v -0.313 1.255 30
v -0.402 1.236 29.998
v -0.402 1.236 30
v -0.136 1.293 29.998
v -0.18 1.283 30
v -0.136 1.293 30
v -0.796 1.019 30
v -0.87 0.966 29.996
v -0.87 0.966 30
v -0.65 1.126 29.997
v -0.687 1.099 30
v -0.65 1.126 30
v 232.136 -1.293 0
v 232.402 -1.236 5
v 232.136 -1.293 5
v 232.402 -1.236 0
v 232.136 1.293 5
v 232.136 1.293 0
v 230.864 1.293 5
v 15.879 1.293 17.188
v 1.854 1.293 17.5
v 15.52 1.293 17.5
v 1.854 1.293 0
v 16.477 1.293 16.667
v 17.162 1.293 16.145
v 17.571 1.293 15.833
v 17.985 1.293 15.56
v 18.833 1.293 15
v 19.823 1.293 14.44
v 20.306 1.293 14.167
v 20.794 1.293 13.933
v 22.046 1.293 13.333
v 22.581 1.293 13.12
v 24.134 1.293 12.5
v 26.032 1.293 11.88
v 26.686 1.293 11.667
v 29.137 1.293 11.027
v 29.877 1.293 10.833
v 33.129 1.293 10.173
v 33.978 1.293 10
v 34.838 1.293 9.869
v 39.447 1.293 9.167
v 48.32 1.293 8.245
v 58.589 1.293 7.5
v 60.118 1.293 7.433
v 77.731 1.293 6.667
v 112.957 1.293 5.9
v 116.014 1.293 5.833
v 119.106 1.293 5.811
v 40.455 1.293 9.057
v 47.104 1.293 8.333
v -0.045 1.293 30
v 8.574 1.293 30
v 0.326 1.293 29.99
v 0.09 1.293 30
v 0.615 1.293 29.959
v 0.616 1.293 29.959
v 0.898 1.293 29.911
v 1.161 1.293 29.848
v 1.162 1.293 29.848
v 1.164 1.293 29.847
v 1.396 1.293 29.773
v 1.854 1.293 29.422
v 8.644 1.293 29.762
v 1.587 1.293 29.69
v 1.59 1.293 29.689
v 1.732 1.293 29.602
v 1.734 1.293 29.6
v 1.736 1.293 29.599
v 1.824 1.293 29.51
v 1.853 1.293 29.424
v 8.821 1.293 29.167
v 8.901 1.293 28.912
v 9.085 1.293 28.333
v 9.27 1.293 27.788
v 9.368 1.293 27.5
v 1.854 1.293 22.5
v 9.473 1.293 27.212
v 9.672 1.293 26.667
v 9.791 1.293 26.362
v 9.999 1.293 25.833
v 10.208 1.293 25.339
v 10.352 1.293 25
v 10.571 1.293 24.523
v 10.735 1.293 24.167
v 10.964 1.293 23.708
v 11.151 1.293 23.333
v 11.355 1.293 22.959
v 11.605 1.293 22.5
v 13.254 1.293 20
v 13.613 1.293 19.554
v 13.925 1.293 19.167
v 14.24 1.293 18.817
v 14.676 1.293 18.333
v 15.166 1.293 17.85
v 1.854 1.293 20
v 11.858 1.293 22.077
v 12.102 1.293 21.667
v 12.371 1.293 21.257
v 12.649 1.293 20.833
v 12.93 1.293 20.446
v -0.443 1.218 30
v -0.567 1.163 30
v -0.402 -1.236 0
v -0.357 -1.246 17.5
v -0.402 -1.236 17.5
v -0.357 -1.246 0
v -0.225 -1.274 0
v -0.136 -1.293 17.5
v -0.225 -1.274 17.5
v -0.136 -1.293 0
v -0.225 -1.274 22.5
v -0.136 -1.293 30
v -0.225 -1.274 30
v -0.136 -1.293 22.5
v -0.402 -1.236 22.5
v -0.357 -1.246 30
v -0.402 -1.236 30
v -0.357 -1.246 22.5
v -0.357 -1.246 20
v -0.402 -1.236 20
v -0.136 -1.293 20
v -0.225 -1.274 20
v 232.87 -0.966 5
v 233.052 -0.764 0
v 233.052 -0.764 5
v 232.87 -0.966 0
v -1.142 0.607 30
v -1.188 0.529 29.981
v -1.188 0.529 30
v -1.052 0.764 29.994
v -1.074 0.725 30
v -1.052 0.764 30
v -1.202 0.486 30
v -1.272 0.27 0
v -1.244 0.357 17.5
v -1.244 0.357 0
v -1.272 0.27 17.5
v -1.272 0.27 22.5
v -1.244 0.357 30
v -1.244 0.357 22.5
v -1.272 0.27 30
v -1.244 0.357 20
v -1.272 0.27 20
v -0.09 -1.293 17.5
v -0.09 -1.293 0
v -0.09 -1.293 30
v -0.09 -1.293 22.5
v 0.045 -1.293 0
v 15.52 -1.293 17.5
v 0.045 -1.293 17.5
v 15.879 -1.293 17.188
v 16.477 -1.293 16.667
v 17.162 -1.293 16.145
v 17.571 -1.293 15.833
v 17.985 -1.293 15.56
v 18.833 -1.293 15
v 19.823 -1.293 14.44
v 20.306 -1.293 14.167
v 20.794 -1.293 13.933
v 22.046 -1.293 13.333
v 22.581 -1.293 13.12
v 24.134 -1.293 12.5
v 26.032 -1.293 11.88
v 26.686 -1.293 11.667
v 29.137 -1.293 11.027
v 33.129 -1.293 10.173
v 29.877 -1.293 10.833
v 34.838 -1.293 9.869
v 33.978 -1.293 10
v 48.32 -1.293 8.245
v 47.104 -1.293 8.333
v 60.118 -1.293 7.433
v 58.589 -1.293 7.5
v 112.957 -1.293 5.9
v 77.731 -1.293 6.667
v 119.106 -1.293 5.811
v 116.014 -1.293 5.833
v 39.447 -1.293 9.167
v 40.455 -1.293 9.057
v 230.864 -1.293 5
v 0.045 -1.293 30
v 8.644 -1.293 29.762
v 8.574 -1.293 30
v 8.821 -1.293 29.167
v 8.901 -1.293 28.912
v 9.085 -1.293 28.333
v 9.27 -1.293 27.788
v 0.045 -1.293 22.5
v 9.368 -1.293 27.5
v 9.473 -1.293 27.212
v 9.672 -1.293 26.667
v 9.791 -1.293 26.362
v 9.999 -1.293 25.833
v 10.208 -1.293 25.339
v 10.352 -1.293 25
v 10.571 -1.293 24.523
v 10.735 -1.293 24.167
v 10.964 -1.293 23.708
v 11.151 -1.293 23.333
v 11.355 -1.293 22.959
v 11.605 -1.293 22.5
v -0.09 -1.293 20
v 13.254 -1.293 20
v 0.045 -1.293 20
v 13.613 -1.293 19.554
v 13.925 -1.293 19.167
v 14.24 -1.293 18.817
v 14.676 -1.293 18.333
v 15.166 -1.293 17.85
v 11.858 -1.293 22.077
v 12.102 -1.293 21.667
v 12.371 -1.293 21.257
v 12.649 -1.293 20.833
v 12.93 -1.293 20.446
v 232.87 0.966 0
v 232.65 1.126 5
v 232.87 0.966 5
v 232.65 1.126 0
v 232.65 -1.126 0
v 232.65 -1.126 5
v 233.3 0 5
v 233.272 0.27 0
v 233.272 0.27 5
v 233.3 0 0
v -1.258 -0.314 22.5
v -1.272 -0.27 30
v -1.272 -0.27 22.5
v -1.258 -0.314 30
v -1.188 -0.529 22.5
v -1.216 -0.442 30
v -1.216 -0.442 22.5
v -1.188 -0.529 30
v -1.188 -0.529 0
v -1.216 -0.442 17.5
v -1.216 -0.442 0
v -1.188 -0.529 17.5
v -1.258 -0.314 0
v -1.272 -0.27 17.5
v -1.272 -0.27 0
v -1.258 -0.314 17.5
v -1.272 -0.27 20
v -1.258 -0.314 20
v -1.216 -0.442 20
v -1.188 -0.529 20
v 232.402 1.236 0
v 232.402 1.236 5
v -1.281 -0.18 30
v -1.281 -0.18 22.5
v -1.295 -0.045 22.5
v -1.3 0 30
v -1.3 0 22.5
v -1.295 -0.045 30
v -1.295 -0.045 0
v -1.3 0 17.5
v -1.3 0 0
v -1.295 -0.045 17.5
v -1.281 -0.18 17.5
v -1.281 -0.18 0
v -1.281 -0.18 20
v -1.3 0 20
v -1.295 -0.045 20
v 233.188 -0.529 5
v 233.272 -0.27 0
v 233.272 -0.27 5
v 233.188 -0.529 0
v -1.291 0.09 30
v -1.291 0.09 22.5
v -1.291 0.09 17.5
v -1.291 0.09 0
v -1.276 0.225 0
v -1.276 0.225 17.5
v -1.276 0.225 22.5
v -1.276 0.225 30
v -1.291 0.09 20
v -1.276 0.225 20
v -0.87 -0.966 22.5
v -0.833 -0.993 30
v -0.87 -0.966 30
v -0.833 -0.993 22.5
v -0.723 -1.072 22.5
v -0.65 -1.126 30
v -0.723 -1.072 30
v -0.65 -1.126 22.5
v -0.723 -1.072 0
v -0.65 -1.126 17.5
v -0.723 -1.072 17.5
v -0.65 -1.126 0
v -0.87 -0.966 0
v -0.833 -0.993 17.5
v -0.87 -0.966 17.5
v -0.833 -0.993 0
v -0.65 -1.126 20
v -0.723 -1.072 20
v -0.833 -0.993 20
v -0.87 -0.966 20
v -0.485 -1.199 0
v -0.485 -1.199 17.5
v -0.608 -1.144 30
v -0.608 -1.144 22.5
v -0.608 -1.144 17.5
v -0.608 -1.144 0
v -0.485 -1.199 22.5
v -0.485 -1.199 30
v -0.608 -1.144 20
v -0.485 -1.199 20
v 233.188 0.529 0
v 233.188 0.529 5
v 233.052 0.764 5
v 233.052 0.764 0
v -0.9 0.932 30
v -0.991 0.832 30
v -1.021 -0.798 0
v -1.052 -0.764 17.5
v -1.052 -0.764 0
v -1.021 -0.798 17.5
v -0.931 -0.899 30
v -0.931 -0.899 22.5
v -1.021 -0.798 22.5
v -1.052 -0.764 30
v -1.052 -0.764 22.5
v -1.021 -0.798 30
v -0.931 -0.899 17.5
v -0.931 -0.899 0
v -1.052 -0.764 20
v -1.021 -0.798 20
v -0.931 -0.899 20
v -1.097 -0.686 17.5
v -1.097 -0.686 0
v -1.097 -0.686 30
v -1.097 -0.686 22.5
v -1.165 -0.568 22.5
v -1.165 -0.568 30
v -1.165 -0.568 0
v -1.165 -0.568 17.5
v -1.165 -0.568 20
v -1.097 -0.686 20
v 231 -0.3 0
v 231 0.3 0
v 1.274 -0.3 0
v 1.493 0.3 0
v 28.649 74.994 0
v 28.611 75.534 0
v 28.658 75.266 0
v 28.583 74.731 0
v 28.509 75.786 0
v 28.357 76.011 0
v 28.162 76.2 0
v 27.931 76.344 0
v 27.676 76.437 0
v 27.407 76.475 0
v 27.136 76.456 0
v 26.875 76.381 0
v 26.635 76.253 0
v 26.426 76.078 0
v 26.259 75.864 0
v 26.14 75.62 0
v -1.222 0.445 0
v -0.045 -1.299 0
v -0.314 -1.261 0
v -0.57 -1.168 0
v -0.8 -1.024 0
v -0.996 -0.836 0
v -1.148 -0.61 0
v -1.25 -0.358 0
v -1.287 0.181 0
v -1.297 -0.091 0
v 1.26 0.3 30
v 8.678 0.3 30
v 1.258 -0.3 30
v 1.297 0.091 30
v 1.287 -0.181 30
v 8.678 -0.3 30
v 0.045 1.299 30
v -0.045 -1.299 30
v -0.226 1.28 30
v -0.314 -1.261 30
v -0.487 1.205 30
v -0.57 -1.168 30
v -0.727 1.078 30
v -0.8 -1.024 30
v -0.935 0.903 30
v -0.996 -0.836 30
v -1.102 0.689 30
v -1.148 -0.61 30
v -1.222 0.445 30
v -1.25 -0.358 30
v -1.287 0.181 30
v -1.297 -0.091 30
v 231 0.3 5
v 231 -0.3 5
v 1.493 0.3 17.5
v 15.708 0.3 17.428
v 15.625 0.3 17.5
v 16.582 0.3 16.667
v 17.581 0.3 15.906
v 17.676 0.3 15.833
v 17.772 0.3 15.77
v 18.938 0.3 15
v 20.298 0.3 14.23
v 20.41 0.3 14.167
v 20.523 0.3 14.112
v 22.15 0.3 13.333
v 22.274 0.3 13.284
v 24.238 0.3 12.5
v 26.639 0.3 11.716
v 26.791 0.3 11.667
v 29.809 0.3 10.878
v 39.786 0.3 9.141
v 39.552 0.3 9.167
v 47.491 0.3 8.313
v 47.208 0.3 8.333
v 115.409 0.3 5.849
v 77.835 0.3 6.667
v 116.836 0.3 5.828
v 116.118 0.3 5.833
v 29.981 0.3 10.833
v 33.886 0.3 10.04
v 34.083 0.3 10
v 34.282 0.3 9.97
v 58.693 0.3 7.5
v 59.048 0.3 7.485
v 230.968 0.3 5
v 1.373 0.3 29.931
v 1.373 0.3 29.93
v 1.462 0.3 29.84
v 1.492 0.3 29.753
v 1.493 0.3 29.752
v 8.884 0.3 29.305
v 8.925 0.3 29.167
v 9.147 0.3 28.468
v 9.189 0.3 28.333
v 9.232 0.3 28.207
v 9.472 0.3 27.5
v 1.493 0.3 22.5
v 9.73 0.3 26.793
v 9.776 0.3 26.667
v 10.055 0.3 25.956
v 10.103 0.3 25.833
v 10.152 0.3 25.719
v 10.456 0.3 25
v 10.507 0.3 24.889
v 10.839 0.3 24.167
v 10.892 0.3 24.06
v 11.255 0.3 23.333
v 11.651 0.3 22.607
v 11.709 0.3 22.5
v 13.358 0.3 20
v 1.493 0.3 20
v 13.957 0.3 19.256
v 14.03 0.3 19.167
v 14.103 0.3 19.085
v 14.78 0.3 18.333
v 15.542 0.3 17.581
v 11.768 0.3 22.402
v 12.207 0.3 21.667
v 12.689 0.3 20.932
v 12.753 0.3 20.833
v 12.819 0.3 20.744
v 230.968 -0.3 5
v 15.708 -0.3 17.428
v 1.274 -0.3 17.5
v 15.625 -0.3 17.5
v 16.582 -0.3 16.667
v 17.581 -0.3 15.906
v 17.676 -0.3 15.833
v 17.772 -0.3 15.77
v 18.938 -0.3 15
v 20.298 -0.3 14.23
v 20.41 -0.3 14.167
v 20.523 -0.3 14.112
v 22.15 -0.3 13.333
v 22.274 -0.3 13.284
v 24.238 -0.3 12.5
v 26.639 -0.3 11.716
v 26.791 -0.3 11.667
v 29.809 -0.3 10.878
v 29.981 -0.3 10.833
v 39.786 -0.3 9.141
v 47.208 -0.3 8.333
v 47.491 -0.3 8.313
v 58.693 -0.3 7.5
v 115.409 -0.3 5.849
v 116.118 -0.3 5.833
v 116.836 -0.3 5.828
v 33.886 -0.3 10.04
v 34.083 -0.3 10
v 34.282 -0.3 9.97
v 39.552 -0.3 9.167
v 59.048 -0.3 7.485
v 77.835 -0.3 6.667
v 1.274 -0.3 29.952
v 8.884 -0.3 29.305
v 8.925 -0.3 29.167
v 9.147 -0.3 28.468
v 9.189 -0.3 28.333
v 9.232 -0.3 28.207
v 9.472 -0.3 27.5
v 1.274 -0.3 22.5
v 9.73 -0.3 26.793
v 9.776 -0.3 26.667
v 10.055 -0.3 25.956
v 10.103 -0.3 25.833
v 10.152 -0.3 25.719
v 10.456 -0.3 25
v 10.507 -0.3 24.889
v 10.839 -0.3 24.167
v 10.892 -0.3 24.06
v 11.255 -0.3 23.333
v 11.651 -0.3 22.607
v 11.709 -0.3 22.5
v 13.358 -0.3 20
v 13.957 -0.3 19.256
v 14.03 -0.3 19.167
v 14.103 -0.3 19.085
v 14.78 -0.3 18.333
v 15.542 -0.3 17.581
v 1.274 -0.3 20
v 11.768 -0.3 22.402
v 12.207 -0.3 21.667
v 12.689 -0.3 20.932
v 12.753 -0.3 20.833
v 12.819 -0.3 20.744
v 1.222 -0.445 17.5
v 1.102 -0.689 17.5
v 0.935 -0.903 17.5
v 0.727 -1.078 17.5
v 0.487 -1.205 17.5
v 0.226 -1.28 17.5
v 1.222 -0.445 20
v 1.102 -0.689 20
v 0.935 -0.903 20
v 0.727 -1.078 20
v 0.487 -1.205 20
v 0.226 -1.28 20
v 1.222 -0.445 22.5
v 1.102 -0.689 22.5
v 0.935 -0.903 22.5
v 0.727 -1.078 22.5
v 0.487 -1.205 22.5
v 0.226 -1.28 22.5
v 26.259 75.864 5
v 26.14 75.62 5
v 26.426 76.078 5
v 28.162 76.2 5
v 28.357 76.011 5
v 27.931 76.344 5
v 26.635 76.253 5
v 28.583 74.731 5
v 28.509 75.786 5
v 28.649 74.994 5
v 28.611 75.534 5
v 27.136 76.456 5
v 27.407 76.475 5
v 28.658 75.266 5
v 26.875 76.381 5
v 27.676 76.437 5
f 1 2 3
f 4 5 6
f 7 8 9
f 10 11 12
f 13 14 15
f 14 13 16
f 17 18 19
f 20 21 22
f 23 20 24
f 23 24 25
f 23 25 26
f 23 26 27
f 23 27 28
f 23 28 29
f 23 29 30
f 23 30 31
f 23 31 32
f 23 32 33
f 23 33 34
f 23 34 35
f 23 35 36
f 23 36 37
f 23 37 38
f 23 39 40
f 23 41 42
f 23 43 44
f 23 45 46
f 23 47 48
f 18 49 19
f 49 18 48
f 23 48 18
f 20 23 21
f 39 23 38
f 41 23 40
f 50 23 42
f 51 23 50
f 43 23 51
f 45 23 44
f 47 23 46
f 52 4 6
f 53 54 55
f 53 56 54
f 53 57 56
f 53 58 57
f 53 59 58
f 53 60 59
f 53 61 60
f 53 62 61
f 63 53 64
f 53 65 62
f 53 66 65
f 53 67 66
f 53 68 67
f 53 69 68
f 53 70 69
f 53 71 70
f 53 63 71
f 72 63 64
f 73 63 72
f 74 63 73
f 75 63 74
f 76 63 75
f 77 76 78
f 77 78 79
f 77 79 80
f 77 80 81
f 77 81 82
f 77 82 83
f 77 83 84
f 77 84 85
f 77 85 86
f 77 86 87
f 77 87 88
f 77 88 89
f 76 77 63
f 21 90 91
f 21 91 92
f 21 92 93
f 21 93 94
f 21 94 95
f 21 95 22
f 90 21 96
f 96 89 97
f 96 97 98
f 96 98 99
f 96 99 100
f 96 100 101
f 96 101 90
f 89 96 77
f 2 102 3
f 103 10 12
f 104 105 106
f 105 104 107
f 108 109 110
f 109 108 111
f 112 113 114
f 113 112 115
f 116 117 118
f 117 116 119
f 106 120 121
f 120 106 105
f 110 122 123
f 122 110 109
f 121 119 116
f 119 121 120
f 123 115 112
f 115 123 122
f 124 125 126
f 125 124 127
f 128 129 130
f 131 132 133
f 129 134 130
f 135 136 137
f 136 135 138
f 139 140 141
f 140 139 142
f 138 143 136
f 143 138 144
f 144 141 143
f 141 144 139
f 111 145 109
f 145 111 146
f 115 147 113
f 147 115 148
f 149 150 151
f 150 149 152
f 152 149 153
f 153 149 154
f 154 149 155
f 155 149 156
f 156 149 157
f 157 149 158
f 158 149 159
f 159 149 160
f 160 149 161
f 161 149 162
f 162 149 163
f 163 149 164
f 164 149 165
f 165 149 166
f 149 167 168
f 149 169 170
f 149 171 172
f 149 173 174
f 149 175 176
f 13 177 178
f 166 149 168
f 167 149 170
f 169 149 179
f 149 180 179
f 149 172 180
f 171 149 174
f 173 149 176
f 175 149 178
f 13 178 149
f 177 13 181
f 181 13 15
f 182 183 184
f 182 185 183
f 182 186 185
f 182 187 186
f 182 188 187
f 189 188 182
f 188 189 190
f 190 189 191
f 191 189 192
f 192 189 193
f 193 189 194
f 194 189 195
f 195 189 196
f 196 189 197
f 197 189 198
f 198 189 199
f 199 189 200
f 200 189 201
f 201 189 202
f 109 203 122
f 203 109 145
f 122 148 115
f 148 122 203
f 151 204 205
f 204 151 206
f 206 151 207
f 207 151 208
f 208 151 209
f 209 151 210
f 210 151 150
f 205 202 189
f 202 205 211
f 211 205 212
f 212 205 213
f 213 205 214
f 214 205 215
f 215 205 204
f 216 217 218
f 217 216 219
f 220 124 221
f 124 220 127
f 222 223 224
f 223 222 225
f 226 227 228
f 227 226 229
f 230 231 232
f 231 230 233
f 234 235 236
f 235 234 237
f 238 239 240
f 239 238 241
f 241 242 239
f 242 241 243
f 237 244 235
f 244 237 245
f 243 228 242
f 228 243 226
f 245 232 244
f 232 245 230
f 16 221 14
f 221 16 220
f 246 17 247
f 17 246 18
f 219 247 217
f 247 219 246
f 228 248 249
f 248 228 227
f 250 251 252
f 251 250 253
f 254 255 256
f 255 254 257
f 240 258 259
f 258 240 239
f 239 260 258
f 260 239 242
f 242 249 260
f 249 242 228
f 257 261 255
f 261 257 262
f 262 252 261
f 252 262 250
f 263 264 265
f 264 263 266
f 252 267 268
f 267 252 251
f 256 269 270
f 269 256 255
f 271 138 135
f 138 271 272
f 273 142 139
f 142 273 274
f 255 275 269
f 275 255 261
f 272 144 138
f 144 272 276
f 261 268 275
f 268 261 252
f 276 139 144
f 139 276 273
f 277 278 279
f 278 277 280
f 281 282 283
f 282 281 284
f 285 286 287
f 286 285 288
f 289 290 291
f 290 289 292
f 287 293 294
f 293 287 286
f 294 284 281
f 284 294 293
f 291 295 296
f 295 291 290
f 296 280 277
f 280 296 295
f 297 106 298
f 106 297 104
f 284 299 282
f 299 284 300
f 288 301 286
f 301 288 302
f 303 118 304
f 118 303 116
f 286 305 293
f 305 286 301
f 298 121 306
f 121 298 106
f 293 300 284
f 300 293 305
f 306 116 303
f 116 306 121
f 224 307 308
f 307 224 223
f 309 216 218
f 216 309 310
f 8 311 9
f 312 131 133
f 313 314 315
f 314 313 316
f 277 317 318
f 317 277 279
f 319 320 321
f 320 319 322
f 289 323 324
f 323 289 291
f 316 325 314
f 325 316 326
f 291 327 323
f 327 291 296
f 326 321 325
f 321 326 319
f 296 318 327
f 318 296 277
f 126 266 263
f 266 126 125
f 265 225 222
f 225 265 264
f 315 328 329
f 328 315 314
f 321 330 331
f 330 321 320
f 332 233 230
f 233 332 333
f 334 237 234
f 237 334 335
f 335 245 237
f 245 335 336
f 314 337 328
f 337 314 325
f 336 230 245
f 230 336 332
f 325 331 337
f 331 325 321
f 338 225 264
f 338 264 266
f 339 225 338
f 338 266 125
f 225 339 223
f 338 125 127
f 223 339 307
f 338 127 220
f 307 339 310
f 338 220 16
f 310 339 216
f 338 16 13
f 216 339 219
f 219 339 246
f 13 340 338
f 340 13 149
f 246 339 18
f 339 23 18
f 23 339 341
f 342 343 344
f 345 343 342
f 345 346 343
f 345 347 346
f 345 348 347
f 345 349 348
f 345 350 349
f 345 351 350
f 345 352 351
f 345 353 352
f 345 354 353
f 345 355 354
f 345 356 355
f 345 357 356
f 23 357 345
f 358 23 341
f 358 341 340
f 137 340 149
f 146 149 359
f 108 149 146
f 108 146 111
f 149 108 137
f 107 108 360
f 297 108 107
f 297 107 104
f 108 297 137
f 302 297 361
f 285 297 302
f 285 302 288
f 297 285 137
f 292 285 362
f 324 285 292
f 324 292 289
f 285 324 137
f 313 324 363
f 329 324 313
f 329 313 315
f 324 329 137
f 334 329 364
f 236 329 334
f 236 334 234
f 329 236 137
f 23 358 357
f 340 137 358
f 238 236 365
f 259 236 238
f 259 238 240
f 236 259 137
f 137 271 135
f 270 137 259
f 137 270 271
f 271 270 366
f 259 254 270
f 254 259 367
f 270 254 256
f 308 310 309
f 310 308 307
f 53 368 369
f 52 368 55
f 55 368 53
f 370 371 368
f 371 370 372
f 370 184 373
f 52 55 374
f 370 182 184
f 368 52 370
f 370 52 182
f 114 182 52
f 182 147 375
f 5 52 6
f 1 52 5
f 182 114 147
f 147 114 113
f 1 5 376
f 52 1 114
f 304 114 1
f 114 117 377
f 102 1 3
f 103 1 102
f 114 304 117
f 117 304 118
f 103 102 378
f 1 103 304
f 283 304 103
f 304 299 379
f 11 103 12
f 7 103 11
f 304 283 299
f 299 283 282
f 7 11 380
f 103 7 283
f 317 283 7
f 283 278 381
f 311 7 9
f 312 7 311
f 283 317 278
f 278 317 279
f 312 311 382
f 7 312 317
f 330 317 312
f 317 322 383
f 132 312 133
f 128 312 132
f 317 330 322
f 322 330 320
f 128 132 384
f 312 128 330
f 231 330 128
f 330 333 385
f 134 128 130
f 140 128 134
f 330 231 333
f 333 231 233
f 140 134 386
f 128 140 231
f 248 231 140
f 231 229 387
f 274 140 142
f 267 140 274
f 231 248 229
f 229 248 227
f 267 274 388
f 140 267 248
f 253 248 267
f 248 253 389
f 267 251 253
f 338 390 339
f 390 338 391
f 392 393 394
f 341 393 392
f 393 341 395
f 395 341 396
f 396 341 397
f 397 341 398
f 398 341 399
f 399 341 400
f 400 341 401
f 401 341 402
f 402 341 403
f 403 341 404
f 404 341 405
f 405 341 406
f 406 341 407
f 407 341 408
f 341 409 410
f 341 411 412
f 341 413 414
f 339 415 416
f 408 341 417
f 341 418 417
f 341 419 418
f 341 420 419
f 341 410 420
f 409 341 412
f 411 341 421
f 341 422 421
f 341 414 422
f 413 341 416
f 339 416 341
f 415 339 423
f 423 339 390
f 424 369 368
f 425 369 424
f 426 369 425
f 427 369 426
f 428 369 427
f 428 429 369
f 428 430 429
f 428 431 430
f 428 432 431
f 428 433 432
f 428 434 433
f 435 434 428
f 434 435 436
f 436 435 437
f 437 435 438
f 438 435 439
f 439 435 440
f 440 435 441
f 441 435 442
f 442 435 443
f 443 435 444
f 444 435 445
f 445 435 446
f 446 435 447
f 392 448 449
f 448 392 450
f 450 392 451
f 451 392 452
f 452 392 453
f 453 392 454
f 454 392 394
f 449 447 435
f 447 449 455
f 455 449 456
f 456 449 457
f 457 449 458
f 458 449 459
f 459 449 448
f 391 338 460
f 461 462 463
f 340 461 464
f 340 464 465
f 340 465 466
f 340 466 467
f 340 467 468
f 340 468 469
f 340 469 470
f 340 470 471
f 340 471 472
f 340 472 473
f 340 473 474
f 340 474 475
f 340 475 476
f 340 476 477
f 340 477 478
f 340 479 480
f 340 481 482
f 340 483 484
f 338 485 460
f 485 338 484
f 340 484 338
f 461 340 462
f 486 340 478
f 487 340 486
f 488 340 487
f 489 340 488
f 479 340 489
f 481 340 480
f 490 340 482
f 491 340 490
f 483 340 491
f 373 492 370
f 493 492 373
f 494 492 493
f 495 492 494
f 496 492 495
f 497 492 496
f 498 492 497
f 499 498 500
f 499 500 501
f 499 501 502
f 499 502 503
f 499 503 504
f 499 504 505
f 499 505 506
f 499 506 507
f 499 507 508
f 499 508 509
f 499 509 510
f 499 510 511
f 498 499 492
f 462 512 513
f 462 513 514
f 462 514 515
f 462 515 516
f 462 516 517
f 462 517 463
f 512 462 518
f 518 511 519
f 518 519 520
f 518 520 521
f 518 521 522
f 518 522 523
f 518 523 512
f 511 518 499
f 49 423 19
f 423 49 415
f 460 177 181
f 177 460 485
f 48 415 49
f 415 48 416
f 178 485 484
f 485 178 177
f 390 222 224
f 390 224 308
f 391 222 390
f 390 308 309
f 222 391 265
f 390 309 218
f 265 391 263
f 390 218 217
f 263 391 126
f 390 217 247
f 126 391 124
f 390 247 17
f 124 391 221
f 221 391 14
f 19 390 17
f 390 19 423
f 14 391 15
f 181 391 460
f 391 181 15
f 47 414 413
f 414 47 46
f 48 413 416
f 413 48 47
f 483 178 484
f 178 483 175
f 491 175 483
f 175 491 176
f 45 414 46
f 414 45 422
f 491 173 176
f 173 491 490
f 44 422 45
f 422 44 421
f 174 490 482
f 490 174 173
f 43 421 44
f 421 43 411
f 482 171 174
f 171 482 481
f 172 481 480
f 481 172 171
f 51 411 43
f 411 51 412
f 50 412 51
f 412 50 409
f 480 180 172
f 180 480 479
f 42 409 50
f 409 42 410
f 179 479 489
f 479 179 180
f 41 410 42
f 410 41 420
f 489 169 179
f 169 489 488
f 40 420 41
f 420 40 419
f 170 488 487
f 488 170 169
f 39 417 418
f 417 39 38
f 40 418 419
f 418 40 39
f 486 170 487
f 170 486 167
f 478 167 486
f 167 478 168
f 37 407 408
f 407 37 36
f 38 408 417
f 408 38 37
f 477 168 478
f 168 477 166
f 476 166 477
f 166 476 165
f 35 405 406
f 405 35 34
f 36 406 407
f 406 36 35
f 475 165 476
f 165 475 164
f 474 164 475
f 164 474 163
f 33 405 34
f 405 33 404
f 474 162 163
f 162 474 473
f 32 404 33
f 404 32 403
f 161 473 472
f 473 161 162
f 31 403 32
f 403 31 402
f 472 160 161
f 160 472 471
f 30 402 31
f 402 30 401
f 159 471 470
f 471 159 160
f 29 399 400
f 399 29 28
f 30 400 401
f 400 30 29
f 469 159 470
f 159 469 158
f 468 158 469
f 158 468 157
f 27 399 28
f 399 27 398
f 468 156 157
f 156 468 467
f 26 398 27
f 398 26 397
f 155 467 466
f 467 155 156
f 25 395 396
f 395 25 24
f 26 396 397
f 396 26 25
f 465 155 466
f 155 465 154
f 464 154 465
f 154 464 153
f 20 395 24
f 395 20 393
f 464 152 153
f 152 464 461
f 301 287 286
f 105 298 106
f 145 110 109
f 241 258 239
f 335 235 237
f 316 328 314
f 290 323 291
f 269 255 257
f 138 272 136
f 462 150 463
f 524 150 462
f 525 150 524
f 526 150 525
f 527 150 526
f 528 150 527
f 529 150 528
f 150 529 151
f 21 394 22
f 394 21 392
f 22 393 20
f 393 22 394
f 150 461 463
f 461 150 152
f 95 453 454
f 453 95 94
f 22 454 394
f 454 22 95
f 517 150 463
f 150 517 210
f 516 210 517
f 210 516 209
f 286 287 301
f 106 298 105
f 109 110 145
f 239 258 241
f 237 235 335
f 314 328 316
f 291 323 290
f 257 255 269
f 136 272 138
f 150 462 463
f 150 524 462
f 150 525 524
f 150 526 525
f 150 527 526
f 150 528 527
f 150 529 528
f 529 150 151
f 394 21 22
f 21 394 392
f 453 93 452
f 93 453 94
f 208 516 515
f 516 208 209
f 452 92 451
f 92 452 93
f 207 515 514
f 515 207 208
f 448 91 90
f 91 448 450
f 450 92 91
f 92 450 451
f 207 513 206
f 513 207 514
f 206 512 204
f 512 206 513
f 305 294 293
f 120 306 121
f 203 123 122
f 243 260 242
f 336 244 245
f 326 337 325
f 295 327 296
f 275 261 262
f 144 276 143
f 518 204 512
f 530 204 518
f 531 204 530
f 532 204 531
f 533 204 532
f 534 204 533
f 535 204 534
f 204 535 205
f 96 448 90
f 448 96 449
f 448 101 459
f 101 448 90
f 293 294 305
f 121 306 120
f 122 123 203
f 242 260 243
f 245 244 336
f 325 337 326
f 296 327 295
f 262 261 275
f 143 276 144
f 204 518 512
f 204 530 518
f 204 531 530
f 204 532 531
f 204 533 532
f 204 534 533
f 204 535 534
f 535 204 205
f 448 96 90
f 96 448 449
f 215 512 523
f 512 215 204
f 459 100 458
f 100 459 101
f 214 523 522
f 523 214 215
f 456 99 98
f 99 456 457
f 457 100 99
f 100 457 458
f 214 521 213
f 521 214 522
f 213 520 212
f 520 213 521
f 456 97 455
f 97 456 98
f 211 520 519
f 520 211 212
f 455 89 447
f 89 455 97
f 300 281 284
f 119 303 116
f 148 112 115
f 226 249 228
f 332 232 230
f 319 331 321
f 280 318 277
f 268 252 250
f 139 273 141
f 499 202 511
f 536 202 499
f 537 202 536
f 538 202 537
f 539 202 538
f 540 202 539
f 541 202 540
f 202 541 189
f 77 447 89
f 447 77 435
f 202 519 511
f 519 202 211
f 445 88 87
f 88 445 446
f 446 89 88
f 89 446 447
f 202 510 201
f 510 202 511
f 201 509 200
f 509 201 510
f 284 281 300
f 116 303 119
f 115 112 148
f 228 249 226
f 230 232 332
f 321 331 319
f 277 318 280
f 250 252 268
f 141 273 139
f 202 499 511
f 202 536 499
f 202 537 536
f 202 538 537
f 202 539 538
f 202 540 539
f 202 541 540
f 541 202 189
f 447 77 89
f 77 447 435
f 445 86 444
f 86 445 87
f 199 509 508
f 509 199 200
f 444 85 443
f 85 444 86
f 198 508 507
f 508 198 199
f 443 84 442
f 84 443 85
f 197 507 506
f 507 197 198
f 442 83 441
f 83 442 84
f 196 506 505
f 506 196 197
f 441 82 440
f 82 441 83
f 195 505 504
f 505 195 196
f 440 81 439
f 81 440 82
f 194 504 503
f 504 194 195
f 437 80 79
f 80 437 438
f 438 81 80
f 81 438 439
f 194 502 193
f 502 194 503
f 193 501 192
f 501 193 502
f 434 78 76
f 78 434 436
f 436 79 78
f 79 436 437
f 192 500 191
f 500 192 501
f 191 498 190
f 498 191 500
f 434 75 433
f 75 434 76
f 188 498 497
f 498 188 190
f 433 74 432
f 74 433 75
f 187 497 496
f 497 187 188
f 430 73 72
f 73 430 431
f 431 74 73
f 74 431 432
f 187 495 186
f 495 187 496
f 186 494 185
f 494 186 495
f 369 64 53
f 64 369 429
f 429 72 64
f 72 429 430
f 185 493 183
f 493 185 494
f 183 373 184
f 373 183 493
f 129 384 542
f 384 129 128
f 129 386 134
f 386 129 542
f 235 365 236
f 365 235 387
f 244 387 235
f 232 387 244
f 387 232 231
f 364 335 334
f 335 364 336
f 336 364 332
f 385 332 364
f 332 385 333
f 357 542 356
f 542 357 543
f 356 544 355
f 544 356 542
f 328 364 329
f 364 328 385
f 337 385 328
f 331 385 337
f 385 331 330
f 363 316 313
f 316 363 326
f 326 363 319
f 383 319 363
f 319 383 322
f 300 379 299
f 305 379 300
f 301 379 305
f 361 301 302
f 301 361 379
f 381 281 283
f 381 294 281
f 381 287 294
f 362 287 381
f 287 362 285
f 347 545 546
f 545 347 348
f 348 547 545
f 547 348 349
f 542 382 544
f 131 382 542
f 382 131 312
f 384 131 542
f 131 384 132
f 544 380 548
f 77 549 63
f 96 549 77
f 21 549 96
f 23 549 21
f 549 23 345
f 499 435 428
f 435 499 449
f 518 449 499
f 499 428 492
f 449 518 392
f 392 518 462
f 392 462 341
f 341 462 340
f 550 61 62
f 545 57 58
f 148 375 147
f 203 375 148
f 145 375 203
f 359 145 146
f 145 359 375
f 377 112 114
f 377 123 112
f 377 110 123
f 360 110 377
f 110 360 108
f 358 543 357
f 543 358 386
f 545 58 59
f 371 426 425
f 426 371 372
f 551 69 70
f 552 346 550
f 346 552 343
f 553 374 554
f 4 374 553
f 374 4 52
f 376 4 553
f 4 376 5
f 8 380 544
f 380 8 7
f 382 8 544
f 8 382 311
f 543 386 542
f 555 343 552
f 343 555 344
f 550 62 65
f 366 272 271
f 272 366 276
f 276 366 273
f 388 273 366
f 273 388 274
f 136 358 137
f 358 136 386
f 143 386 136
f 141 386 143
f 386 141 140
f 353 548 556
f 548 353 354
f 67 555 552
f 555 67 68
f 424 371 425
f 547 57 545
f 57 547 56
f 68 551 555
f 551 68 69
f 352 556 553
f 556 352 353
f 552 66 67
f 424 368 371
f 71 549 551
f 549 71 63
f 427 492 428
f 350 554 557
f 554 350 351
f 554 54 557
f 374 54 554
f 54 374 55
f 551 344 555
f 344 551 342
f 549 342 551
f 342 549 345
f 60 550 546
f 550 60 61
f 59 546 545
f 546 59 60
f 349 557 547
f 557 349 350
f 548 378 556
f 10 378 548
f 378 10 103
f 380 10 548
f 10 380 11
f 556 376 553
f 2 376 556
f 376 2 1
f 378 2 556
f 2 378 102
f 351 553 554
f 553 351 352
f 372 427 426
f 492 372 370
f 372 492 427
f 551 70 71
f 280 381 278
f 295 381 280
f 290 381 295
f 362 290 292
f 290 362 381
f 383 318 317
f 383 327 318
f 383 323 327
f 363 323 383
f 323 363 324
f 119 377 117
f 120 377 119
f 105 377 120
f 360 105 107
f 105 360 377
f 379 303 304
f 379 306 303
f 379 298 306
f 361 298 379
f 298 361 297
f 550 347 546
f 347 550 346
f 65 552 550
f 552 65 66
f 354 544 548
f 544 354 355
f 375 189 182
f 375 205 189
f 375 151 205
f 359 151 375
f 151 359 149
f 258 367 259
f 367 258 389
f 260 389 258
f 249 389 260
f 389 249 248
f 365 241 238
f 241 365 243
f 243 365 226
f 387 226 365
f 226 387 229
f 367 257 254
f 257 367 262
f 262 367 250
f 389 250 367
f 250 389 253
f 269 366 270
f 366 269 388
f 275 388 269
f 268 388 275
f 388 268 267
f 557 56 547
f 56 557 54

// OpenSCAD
paper_thickness = 0.6;
thickness = 1;
paper_height = 230;
max_width = 30;
min_width = 5;
stand_angle = 20;
stand_length = 80;

$fn = 30;
$fs = 0.3;
$fa = 1;

intersection() {
	difference() {
		hull() {
			cylinder(r=thickness + paper_thickness / 2, h=max_width);
			translate([thickness * 2 + paper_height, 0, 0]) {
				cylinder(r=thickness + paper_thickness / 2, h=max_width);
			}
		}
		translate([thickness, -paper_thickness / 2, -1]) {
			cube([paper_height, paper_thickness, max_width + 2]);
		}
	}
	union() {
		hull() { //Base height of min_width.
			cylinder(r=thickness + paper_thickness / 2, h=min_width);
			translate([thickness * 2 + paper_height, 0, 0]) {
				cylinder(r=thickness + paper_thickness / 2, h=min_width);
			}
		}
		//The curve is a stack of cones.
		curve_width = paper_height + thickness;
		for(i = [1:$fn]) {
			frac_lower = 1 / (i / $fn) / $fn;
			frac_higher = 1 / ((i + 1) / $fn) / $fn;
			translate([0, 0, min_width + (i - 1) / $fn * (max_width - min_width)]) {
				cylinder(r1=(thickness + paper_thickness / 2) * (1 - frac_lower) + curve_width * frac_lower, r2=(thickness + paper_thickness / 2) * (1 - frac_higher) + curve_width * frac_higher, h=(max_width - min_width) / $fn);
			}
		}
	}
}

rotate([0, 0, -stand_angle]) {
	hull() {
		cylinder(r=thickness + paper_thickness / 2, h=max_width);
		translate([0, stand_length, 0]) {
			cylinder(r=thickness + paper_thickness / 2, h=min_width);
		}
	}
}
